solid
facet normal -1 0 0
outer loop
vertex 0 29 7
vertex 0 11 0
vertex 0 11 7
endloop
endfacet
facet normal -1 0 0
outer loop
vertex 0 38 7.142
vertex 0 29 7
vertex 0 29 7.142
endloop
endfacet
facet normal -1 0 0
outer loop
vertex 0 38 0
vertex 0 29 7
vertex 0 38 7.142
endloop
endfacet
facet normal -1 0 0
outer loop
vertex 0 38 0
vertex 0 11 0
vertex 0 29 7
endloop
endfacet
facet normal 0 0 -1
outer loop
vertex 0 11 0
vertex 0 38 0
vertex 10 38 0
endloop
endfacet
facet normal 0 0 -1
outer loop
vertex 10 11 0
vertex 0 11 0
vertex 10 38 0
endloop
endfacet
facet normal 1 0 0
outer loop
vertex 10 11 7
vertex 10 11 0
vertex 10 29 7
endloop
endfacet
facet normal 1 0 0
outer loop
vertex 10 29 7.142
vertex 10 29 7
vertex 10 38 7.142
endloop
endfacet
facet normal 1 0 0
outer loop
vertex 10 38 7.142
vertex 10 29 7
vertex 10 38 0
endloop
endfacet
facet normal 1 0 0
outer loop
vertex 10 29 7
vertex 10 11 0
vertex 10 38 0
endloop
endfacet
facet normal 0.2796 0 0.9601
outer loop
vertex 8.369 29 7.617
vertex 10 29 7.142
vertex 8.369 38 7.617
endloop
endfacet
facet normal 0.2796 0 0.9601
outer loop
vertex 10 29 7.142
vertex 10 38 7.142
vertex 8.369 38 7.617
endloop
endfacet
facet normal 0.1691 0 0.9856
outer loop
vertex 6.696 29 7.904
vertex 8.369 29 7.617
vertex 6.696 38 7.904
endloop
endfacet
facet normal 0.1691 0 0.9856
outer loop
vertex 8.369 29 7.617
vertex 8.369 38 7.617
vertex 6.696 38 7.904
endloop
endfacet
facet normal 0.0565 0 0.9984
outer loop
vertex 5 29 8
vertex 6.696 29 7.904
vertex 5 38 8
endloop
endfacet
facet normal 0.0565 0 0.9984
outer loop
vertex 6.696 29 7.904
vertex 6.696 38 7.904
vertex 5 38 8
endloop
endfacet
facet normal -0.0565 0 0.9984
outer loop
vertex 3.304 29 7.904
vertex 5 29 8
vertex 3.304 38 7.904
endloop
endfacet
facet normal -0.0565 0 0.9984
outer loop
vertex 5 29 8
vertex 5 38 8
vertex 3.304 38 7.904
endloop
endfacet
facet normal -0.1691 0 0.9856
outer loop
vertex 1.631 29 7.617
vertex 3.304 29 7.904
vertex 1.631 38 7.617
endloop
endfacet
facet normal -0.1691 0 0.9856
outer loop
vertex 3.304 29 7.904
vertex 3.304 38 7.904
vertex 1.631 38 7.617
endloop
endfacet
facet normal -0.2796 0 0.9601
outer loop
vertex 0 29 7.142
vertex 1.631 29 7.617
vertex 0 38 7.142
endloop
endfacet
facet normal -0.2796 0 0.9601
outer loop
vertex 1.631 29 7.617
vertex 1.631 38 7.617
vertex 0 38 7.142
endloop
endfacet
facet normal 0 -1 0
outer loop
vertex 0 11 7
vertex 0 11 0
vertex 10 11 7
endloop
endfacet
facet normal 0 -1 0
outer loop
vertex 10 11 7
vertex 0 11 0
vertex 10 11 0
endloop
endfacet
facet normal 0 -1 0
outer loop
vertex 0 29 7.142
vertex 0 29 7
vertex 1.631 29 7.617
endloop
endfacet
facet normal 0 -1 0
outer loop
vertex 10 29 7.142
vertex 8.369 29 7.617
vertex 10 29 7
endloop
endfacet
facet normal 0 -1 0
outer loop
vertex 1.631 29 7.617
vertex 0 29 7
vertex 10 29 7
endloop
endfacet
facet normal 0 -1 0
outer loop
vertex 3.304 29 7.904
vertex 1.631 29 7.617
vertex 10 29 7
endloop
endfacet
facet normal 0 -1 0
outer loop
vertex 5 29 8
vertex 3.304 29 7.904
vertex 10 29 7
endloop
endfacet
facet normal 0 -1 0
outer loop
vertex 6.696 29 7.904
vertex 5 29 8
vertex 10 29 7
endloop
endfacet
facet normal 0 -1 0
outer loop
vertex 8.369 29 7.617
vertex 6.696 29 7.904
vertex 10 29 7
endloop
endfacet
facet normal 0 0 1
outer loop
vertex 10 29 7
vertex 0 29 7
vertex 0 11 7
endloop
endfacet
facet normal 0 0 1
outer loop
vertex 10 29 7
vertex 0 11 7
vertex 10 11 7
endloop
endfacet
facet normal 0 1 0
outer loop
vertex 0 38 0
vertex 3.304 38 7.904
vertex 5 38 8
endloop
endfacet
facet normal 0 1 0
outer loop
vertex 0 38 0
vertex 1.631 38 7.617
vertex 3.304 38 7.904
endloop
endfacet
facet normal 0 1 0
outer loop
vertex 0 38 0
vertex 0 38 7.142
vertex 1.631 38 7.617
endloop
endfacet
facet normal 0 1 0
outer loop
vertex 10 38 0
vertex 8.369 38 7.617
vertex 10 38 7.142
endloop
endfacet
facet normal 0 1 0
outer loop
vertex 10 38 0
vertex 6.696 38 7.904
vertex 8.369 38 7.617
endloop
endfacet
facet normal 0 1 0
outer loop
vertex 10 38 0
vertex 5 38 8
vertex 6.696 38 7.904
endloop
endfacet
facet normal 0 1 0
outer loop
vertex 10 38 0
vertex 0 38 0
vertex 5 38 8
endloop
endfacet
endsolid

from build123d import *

# Parameters (mm, degrees)
BOX001_W            = 10
BOX001_H            = 18
BOX001_DEPTH        = 10
BOX_W               = 10
BOX_H               = 27
BOX_DEPTH           = 8
CYLINDER_R          = 15
CYLINDER_DEPTH      = 40
CYLINDER_ROLL_ANGLE = 90


with BuildPart() as flat_top:
    # Box001 → Box001 (new body)
    with BuildSketch(Plane.XY.offset(7)):
        with Locations((5, 9)):
            Rectangle(BOX001_W, BOX001_H)
    extrude(amount=BOX001_DEPTH)


with BuildPart() as pin:
    # Box → Box (new body)
    with BuildSketch(Plane.XY):
        with Locations((5, 13.5)):
            Rectangle(BOX_W, BOX_H)
    extrude(amount=BOX_DEPTH)


with BuildPart() as cut:
    # Cylinder → Cylinder (new body)
    with BuildSketch(Plane.XY):
        Circle(CYLINDER_R)
    extrude(amount=CYLINDER_DEPTH)


with BuildPart() as cut_1:
    # Cylinder roll: moved
    add(cut.part.rotate(Axis((0, 0, 0), (1, 0, 0)), CYLINDER_ROLL_ANGLE))


with BuildPart() as cut_2:
    # Cylinder placement: moved
    add(cut_1.part.moved(Location((5, 35, -7))))

    # Common: intersect pin
    add(pin.part, mode=Mode.INTERSECT)

    # Cut: cut flat_top
    add(flat_top.part, mode=Mode.SUBTRACT)


with BuildPart() as cut_3:
    # Cut placement: moved
    add(cut_2.part.moved(Location((0, 11, 0))))


solid = cut_3.part
